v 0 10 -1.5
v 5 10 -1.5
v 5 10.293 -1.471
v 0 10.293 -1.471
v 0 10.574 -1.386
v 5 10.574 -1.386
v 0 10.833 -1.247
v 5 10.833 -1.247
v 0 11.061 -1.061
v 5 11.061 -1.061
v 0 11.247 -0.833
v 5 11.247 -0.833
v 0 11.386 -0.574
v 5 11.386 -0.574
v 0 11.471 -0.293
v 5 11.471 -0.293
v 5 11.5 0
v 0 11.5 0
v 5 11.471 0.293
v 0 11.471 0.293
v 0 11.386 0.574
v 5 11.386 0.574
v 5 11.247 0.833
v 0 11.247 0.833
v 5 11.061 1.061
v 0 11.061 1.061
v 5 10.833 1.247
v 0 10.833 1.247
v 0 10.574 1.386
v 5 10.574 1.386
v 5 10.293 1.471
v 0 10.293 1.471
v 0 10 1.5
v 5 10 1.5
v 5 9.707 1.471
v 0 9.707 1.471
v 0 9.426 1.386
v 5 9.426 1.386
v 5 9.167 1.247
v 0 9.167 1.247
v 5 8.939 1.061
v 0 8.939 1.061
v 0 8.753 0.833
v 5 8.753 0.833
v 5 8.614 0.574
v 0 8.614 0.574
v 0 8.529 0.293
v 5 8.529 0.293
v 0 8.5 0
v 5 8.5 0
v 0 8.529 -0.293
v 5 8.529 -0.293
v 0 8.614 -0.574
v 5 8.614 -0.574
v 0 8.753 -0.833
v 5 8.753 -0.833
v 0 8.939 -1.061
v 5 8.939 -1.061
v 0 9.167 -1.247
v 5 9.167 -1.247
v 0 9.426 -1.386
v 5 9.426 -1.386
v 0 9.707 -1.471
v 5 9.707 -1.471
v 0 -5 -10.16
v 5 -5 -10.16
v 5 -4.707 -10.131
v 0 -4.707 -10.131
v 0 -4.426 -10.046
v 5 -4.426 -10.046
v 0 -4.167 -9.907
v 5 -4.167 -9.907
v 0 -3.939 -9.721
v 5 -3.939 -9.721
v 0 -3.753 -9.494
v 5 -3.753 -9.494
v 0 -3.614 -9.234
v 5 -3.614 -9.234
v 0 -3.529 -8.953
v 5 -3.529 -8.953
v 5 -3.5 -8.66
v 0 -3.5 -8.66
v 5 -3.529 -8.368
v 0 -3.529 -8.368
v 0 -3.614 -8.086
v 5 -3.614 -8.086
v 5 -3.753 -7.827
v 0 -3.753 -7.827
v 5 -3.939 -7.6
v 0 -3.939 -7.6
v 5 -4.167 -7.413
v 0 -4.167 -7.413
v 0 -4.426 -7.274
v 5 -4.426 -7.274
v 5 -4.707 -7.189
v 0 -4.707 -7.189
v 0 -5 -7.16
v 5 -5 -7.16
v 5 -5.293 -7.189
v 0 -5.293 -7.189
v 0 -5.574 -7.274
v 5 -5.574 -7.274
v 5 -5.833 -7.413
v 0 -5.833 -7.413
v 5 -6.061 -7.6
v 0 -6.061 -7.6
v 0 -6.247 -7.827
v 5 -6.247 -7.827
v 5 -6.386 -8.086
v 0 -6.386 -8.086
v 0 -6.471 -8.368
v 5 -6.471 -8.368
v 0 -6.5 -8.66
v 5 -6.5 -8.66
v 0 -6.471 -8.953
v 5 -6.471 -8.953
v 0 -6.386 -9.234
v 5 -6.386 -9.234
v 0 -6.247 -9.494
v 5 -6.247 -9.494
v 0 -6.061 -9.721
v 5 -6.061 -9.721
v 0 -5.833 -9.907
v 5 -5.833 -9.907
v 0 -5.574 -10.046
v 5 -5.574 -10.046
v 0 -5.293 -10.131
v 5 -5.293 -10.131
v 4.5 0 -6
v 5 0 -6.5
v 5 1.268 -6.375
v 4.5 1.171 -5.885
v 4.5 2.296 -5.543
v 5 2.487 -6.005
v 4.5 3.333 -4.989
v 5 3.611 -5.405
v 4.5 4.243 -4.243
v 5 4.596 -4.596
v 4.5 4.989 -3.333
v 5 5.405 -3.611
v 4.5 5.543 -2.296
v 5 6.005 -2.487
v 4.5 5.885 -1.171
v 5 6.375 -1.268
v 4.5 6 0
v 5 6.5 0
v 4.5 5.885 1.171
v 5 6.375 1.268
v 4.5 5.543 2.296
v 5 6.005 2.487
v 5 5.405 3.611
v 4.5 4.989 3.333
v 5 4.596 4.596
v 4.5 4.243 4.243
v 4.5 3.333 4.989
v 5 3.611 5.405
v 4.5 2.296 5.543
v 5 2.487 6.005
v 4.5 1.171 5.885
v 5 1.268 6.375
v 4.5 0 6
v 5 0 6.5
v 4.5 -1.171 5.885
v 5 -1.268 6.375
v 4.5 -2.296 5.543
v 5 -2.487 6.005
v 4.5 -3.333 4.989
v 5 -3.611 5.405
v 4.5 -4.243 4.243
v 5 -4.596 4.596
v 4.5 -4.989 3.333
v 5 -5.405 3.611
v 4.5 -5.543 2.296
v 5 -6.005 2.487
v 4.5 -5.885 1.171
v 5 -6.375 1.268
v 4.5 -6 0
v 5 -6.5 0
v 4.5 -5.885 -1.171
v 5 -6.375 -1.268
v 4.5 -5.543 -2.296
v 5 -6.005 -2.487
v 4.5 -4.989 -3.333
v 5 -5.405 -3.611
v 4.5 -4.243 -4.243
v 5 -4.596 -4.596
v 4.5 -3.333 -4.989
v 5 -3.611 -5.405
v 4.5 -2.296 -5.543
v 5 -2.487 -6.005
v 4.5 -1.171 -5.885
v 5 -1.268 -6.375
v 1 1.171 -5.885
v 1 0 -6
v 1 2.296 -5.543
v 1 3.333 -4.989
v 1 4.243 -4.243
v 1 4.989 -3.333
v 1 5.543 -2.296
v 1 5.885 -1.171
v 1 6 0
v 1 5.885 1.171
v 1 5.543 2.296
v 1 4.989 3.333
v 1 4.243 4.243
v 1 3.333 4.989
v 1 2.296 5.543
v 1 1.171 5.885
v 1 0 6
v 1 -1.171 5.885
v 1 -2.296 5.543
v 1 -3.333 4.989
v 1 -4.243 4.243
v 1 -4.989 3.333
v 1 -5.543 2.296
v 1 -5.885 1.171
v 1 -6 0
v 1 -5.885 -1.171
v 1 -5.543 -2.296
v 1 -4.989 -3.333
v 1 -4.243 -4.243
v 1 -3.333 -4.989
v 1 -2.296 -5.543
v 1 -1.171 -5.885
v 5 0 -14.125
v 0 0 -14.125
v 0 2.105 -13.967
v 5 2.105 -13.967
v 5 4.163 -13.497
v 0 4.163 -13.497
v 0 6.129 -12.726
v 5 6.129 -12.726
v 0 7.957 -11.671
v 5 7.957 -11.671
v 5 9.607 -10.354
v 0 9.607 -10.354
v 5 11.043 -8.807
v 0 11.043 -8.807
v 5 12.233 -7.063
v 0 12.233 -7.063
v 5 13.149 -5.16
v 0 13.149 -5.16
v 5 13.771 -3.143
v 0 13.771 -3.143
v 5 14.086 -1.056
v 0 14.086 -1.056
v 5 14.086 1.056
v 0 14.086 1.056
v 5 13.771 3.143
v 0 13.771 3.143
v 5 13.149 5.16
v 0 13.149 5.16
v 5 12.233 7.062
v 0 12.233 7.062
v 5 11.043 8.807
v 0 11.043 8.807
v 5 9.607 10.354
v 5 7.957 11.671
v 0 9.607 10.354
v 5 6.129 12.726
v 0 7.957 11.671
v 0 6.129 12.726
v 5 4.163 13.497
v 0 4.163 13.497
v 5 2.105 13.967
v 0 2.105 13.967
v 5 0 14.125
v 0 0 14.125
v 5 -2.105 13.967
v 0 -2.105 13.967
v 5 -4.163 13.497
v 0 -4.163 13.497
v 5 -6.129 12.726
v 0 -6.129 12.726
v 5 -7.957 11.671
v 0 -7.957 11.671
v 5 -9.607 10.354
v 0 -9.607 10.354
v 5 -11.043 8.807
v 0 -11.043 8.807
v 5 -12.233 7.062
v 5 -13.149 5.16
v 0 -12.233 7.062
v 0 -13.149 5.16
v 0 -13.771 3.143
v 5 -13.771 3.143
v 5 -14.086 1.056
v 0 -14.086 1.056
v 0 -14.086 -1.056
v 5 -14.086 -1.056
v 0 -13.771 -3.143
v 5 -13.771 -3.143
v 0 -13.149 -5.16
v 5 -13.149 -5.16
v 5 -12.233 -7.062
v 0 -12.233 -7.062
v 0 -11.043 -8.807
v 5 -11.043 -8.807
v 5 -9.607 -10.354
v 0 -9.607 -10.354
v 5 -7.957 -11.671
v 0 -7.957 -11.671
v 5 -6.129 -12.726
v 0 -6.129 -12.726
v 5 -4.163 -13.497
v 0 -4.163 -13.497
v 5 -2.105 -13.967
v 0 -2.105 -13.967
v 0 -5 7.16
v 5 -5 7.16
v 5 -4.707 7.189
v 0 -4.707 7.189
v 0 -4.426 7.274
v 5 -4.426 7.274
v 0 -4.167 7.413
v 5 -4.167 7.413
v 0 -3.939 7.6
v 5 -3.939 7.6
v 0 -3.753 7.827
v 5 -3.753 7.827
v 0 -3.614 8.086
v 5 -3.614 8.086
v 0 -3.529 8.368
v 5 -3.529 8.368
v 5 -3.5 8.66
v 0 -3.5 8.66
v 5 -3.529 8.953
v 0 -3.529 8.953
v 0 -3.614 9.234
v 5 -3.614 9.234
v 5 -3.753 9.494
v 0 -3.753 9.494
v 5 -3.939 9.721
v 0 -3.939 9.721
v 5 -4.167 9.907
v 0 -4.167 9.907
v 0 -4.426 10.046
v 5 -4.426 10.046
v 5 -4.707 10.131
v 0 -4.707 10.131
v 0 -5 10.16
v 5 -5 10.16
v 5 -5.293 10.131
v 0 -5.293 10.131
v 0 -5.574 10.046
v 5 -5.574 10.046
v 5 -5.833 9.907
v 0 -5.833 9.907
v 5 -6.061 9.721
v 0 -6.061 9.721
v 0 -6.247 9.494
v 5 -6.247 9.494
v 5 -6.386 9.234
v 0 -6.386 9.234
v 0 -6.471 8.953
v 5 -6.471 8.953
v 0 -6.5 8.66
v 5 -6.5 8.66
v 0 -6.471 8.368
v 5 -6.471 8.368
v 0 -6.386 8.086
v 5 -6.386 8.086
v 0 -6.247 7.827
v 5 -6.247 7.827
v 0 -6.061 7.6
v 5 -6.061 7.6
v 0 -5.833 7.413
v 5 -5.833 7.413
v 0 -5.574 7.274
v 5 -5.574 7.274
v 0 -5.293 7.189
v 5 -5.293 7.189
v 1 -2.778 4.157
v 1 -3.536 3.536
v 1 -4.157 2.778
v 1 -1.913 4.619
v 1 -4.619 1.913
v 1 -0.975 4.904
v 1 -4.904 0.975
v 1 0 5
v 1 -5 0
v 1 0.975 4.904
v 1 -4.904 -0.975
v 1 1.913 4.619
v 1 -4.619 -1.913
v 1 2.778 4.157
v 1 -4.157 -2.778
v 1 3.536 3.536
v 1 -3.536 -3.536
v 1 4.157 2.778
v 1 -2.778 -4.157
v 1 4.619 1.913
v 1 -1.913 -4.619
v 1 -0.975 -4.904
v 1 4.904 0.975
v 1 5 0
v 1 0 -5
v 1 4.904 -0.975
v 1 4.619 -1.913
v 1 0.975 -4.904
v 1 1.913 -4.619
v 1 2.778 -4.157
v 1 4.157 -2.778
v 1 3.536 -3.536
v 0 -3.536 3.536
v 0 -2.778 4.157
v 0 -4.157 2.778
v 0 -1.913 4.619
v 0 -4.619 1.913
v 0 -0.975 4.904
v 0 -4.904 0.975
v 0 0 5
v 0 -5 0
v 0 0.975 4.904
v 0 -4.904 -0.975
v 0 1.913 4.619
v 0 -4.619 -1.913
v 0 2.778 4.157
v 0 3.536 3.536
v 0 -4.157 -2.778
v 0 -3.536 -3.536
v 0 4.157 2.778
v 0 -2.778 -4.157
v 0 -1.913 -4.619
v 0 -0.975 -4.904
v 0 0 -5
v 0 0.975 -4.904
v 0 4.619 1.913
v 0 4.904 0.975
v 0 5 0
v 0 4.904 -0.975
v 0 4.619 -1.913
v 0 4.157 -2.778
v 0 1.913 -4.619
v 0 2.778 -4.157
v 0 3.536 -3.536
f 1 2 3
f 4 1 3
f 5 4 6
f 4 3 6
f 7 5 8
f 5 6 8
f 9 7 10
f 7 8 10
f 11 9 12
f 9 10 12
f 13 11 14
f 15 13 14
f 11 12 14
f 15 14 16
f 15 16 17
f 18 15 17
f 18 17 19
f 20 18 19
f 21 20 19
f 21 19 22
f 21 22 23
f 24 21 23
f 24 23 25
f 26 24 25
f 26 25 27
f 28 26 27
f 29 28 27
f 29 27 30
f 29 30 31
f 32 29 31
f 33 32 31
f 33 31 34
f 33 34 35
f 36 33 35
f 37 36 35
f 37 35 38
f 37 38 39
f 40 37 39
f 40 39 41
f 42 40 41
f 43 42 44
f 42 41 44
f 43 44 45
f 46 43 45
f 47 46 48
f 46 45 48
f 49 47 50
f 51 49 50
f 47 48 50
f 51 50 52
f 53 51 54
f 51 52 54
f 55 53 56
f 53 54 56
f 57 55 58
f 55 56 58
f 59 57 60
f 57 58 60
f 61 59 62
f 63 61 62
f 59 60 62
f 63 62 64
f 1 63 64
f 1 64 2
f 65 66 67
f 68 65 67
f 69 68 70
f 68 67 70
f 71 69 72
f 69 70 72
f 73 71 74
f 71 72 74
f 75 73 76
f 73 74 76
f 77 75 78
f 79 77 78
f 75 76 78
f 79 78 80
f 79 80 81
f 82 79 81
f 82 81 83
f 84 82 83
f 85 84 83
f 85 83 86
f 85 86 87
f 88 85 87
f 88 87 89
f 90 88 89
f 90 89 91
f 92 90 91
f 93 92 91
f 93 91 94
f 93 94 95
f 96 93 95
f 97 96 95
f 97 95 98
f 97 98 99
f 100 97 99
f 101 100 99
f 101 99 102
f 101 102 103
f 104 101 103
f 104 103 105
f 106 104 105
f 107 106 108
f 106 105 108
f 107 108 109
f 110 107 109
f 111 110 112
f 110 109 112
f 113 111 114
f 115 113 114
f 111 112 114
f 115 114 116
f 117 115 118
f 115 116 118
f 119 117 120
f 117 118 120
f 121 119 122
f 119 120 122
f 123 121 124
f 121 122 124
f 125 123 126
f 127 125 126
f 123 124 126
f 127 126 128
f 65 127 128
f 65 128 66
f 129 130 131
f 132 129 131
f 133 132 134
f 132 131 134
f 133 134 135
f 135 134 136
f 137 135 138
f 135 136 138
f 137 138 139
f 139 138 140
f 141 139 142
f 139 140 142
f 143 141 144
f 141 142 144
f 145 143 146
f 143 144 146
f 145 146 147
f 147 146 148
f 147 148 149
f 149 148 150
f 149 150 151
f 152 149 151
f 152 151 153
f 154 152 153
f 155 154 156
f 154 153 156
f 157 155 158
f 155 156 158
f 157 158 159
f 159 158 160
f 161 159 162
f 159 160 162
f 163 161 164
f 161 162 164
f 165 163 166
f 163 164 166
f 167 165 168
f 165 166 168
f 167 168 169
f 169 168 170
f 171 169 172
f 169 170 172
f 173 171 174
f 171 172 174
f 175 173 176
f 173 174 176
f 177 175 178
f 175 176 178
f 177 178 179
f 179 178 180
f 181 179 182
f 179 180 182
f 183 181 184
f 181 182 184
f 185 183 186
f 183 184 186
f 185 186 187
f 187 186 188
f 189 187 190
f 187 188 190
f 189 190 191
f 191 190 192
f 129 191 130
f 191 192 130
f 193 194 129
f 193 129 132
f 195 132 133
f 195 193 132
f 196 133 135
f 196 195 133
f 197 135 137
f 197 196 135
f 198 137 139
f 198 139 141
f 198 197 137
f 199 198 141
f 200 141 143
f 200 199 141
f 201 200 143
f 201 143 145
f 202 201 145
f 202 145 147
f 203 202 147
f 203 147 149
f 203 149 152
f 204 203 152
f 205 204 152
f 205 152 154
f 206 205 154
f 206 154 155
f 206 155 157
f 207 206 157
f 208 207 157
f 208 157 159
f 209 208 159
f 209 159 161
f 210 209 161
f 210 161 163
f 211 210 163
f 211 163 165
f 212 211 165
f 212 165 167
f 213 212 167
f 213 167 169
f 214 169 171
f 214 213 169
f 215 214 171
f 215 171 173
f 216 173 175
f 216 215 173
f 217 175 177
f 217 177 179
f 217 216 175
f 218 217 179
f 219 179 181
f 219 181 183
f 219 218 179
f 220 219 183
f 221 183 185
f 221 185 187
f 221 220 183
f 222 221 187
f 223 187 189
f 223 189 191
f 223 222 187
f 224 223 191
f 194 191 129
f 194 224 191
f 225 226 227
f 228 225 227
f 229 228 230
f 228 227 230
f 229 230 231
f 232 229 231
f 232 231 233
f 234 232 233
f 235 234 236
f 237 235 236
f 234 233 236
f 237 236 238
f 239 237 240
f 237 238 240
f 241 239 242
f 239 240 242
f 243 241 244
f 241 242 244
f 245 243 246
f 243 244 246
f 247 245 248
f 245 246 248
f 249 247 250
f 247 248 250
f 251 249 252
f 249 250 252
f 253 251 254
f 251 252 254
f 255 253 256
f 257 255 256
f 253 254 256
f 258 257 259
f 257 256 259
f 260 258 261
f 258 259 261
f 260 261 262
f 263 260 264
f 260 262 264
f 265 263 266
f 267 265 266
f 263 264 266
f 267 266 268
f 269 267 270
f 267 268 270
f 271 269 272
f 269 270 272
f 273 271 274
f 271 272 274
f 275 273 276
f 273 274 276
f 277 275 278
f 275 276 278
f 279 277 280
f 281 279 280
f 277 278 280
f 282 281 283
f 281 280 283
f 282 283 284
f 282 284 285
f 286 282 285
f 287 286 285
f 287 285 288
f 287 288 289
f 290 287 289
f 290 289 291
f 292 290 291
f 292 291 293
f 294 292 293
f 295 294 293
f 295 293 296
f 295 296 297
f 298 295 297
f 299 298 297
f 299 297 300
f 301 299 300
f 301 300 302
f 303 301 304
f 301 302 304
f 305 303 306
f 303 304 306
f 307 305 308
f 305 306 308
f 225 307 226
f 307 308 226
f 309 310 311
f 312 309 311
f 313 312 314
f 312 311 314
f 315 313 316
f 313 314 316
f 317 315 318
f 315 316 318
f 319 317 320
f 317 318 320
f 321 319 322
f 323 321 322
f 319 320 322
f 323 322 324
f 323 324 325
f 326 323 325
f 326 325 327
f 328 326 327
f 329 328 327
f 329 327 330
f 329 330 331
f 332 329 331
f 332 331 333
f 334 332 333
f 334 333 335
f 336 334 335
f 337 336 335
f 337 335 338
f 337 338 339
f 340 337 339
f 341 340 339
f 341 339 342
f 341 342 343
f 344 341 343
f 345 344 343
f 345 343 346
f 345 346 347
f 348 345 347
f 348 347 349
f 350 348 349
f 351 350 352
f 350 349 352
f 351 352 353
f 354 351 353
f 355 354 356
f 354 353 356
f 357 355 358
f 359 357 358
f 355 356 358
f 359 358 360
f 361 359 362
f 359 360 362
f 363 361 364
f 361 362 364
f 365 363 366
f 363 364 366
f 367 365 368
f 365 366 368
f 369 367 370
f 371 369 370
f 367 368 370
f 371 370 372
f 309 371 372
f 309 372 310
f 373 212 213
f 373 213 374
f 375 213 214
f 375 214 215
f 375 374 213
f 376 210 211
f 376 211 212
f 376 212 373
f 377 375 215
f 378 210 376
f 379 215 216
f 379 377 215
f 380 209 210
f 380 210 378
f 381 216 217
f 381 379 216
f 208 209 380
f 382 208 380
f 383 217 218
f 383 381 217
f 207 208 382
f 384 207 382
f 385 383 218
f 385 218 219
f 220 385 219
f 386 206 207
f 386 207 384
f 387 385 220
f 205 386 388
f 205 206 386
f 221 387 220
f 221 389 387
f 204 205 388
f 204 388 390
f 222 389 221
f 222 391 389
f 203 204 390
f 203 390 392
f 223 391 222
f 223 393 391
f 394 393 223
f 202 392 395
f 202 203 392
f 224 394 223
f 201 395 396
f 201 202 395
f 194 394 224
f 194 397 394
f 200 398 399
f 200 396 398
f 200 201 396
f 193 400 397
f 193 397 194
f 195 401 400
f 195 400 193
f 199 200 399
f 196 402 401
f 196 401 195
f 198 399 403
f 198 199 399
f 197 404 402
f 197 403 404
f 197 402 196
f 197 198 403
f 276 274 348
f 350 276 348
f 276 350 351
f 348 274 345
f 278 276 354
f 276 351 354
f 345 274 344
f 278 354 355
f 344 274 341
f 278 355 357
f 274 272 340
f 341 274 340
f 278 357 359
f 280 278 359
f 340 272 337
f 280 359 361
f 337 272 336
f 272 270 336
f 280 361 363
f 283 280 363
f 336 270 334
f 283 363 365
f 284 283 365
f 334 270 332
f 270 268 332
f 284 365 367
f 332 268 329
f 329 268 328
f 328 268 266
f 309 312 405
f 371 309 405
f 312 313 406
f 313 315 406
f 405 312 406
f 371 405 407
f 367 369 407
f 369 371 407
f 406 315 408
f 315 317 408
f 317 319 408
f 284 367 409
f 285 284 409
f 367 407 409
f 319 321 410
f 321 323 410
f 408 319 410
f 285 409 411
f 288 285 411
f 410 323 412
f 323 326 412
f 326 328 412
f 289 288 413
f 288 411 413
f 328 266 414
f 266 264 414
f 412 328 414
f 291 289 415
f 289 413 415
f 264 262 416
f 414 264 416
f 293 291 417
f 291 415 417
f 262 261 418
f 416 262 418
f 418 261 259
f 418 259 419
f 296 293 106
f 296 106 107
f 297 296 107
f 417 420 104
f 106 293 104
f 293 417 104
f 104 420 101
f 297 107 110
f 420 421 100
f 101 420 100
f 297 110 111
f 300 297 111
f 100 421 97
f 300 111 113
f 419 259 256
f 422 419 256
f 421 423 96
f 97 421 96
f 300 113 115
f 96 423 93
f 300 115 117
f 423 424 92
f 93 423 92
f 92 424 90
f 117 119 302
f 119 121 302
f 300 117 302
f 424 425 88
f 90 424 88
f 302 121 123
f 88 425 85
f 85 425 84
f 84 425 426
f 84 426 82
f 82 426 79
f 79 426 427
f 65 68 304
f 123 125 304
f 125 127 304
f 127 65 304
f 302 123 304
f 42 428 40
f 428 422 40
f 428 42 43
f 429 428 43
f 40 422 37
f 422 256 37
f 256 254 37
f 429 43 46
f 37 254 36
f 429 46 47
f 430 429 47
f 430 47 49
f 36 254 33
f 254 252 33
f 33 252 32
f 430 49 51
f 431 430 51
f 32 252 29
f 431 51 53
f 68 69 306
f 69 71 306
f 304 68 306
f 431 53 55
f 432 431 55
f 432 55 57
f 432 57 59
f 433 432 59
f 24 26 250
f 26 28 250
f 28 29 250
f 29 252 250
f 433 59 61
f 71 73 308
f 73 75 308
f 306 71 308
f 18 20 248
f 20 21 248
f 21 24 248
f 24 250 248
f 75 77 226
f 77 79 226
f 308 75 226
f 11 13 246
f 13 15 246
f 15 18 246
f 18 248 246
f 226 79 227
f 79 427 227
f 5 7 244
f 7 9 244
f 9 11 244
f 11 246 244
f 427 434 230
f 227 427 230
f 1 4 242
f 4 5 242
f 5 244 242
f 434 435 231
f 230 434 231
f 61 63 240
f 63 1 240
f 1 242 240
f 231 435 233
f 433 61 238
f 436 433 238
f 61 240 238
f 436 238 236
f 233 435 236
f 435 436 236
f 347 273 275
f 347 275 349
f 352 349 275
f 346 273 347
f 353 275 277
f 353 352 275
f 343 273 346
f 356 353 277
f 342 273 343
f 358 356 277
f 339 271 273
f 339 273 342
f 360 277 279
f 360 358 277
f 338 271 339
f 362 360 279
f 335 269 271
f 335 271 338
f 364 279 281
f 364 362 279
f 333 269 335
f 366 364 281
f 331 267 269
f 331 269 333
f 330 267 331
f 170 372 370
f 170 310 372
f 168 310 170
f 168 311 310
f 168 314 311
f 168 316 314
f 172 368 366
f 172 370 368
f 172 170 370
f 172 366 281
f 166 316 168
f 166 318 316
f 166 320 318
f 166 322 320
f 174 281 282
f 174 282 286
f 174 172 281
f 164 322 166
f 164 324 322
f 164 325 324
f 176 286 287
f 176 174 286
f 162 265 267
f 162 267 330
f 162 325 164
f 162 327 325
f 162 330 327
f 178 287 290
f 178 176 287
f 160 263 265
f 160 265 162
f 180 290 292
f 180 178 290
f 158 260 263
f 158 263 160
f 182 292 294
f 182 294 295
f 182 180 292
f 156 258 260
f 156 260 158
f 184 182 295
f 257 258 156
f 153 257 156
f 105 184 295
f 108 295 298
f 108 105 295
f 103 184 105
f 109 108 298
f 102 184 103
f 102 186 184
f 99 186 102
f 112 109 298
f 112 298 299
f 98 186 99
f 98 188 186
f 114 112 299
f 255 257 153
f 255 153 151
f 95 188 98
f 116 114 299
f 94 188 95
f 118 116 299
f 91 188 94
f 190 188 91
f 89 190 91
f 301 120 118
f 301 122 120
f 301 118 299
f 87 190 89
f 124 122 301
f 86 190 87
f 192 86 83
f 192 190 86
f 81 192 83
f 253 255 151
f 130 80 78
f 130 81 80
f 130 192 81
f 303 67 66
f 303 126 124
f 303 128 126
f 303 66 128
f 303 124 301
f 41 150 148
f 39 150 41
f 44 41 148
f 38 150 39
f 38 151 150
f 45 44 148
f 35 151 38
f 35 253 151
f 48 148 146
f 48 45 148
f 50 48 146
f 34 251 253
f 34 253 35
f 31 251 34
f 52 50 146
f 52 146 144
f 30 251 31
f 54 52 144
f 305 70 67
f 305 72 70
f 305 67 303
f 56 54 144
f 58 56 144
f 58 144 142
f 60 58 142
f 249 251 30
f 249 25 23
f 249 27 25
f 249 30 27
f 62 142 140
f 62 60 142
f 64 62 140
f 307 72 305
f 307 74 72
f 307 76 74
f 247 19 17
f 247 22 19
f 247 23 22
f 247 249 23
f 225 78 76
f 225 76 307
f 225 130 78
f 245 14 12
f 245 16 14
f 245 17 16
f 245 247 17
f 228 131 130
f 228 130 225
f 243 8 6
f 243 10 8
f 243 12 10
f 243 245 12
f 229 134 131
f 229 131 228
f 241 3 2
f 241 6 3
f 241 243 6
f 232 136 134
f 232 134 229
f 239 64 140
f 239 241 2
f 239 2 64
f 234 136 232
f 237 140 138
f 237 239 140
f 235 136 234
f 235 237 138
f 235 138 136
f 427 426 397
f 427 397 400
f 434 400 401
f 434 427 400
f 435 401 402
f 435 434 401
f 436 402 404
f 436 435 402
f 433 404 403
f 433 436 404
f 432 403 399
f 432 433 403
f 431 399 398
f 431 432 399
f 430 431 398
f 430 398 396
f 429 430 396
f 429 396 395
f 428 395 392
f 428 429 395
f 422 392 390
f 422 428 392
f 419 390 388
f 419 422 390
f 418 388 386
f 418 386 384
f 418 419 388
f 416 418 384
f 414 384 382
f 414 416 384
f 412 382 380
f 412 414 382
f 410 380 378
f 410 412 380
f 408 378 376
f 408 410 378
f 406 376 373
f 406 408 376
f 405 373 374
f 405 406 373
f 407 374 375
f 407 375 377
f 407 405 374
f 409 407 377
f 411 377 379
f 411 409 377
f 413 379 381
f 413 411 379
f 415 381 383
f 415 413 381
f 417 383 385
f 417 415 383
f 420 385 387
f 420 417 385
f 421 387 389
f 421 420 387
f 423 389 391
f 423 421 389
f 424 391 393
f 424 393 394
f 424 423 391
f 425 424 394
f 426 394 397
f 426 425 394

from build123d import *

# Parameters (mm, degrees)
SKETCH3_R           = 14.125
SKETCH3_R_2         = 6
BOSS_EXTRUDE1_DEPTH = 5
BOSS_EXTRUDE2_START = -5
SKETCH4_R           = 6
SKETCH4_R_2         = 5
BOSS_EXTRUDE2_DEPTH = 1
SKETCH5_R           = 1.5
CUT_EXTRUDE1_DEPTH  = 10
CHAMFER1_SIZE       = 0.5


with BuildPart() as part:
    # Sketch3 → Boss-Extrude1 (new body)
    with BuildSketch(Plane.YZ):
        with Locations(Location((0, 0, 0), (0, 0, 270))):
            Circle(SKETCH3_R)
        with Locations(Location((0, 0, 0), (0, 0, 270))):
            Circle(SKETCH3_R_2, mode=Mode.SUBTRACT)
    extrude(amount=BOSS_EXTRUDE1_DEPTH)

    # Sketch4 → Boss-Extrude2 (add)
    with BuildSketch(Plane.YZ.offset(5).offset(BOSS_EXTRUDE2_START)):
        with Locations(Location((0, 0, 0), (0, 0, 270))):
            Circle(SKETCH4_R)
        with Locations(Location((0, 0, 0), (0, 0, 270))):
            Circle(SKETCH4_R_2, mode=Mode.SUBTRACT)
    extrude(amount=BOSS_EXTRUDE2_DEPTH)

    # Sketch5 → Cut-Extrude1 (cut)
    with BuildSketch(Plane(origin=(5, 0, 0), x_dir=(0, 0, -1), z_dir=(1, 0, 0))):
        with Locations((0, 10)):
            Circle(SKETCH5_R)
        with Locations((8.660254038, -5)):
            Circle(SKETCH5_R)
        with Locations((-8.660254038, -5)):
            Circle(SKETCH5_R)
    extrude(amount=-CUT_EXTRUDE1_DEPTH, mode=Mode.SUBTRACT)

    # Chamfer1
    chamfer1_edges = [part.edges().sort_by_distance(p)[0] for p in [
        (5, 0, 6),
    ]]
    chamfer(chamfer1_edges, length=CHAMFER1_SIZE)


solid = part.part
